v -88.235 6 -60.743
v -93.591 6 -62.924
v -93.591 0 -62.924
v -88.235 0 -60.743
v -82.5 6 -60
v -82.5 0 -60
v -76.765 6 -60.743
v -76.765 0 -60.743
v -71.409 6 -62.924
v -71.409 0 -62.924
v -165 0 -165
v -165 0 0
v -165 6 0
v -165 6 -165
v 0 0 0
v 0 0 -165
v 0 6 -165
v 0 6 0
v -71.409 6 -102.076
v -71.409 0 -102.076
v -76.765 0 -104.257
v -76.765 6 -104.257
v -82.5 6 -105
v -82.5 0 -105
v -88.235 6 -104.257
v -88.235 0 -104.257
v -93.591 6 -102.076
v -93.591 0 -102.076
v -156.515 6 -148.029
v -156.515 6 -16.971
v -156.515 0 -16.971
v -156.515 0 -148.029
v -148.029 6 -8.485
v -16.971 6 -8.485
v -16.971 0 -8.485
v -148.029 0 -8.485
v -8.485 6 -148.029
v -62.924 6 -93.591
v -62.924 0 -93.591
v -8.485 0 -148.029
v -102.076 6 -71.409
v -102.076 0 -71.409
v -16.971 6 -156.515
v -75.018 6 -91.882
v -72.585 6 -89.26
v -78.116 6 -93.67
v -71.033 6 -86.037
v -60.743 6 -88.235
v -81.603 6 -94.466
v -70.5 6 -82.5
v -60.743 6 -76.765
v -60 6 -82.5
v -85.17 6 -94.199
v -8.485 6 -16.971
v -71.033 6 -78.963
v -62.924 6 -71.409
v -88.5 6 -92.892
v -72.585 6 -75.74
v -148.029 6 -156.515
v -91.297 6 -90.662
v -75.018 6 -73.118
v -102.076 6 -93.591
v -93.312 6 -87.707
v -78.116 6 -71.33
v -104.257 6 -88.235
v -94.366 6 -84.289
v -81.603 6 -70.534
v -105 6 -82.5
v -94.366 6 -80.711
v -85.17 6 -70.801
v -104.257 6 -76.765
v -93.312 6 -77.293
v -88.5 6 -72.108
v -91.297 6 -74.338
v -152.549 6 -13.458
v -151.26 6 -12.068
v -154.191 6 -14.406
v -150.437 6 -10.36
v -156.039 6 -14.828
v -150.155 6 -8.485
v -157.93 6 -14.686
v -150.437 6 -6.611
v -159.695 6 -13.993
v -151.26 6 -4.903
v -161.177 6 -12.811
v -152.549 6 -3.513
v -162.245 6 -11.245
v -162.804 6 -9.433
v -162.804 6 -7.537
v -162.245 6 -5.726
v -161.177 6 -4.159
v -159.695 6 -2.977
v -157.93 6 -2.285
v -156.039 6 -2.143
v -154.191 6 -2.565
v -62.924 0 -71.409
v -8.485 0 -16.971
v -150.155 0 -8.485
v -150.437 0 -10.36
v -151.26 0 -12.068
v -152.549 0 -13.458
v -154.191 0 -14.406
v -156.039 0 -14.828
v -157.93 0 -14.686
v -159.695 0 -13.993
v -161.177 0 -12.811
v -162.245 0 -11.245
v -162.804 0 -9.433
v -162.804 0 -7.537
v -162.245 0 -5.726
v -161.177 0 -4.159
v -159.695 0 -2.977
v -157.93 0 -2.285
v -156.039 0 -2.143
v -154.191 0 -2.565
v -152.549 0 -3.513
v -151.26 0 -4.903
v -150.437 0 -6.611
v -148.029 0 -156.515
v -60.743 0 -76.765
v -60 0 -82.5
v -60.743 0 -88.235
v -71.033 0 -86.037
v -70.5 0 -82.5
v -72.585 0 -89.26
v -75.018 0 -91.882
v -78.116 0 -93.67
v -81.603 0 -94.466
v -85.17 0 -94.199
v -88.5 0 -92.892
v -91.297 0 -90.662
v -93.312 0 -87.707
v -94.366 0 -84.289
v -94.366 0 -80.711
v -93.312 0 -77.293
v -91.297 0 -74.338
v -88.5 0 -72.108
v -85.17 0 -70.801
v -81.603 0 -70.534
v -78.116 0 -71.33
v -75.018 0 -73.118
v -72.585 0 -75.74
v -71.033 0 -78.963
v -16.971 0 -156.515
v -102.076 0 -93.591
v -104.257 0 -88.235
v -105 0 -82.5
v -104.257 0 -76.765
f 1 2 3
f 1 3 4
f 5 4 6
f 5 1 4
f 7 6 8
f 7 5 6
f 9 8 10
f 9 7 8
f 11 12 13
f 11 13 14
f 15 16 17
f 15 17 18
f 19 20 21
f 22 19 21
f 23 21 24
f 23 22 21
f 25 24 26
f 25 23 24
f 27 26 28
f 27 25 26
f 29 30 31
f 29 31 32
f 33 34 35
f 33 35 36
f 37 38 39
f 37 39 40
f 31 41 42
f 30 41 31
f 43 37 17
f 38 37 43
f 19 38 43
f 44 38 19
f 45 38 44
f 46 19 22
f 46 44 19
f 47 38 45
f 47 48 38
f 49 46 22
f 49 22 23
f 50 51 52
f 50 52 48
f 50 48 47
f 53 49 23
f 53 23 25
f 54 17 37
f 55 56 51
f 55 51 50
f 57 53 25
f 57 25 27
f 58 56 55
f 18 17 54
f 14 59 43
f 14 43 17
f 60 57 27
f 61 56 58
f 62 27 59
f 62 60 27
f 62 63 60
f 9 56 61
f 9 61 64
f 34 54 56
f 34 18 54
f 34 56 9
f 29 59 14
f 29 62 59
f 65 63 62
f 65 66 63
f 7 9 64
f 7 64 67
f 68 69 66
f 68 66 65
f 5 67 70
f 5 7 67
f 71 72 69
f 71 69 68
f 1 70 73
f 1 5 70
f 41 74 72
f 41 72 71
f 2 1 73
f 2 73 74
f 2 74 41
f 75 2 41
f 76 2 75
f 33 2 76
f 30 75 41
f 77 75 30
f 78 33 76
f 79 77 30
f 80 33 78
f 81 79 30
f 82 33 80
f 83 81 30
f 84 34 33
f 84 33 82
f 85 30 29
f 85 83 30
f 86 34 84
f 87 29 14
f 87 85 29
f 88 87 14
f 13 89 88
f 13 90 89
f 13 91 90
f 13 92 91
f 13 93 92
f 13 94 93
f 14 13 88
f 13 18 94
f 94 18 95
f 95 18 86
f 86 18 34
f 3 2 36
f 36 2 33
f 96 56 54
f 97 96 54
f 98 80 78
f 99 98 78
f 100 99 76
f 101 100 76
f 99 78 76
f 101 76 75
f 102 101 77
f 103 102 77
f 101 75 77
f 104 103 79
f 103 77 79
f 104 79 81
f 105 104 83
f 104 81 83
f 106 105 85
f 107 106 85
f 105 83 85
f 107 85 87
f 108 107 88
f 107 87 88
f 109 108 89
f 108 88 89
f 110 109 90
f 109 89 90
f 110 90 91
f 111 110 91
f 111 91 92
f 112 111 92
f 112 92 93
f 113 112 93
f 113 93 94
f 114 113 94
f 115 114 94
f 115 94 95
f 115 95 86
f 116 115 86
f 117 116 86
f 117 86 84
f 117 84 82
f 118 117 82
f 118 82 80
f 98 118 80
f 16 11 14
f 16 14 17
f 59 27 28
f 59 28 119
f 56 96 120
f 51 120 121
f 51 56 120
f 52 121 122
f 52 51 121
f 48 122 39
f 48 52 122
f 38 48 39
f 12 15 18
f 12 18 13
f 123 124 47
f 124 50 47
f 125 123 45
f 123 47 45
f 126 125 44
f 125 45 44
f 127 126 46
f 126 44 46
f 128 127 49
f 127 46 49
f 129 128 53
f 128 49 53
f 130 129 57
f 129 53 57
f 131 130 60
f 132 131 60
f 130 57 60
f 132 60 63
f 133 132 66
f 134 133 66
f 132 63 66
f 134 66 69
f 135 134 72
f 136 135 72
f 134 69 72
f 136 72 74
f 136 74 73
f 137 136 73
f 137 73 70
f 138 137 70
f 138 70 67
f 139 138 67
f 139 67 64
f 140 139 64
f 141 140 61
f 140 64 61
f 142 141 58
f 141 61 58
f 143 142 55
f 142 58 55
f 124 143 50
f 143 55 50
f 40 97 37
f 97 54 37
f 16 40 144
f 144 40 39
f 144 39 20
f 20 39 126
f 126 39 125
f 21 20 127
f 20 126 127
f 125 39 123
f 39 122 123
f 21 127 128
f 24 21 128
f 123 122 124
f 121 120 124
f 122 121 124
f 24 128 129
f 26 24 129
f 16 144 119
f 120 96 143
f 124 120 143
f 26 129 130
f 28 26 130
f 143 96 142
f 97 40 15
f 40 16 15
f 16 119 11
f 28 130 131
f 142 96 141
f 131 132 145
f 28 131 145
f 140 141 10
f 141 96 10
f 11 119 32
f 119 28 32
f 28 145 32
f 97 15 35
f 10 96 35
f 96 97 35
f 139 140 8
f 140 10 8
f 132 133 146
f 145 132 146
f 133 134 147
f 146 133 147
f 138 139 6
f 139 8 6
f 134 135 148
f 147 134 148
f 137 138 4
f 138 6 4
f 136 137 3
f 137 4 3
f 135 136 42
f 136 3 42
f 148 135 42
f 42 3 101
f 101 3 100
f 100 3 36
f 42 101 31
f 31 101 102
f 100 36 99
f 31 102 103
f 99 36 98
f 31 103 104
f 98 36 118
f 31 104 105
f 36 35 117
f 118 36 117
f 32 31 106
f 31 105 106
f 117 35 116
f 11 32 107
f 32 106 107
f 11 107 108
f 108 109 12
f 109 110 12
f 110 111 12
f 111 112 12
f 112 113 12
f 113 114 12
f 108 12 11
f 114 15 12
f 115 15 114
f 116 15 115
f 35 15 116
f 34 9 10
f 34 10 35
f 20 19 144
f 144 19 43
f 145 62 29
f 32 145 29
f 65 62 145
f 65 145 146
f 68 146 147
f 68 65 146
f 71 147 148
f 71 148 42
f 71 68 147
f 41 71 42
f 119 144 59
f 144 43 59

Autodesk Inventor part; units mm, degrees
ref_plane "YZ Plane" through (0, 0, 0) normal (1, 0, 0) x (0, 1, 0)
ref_plane "XZ Plane" through (0, 0, 0) normal (0, 1, 0) x (-1, 0, 0)
ref_plane "XY Plane" through (0, 0, 0) normal (0, 0, 1) x (1, 0, 0)
sketch "Boceto4" plane through (0, 0, 0) normal (0, 1, 0) x (-1, 0, 0)
  line L0 (0, 0) -> (165, 0)
  line L1 (165, 0) -> (165, -165)
  line L2 (165, -165) -> (0, -165)
  line L3 (0, -165) -> (0, 0)
  dimension "d6" = 165
  dimension "d7" = 165
extrude "Extrusión2" add sketch "Boceto4" along normal blind 6
sketch "Boceto5" plane through (0, 6, 0) normal (0, 1, 0) x (1, 0, 0)
  line L0 (-165, 0) -> (0, 0) projected
  line L1 (0, 165) -> (-165, 165) projected
  line L2 (0, 0) -> (-165, 165)
  line L3 (-165, 165) -> (0, 165)
  line L4 (-165, 165) -> (-165, 0) projected
  line L5 (0, 165) -> (-165, 0)
  circle A0 centre (-82.5, 82.5) radius 12
  circle A1 centre (-82.5, 82.5) radius 22.5
  line L6 (-82.5, 82.5) -> (-89.5711, 75.4289)
  line L7 (-82.5, 82.5) -> (-75.4289, 89.5711)
  line L8 (0, 0) -> (0, 165) projected
  line L9 (-82.5, 82.5) -> (-86.7426, 78.2574)
  line L10 (-86.7426, 78.2574) -> (-8.4853, 0)
  line L11 (-82.5, 82.5) -> (-78.2574, 86.7426)
  line L12 (-78.2574, 86.7426) -> (0, 8.4853)
  line L13 (-86.7426, 78.2574) -> (-165, 156.5147)
  line L14 (-78.2574, 86.7426) -> (-156.5147, 165)
  dimension "d10" = 24
  dimension "d11" = 45
  dimension "d14" = 6
  dimension "d15" = 6
extrude "Extrusión3" cut sketch "Boceto5" against normal through all contours A0 L13 L5 | L5 L10 A0 | L10 L5 L2 A0 | A0 L2 L5 L13 | L2 L5 L12 A0 | A0 L14 L5 L2 | L12 L5 A0 | A0 L5 L14
sketch "Boceto6" plane through (0, 6, 0) normal (0, 1, 0) x (1, 0, 0)
  line L0 (-165, 165) -> (-165, 0) projected
  line L1 (-165, 165) -> (0, 0)
  line L2 (0, 0) -> (0, 165) projected
  line L3 (-165, 0) -> (0, 165)
  circle A0 centre (-82.5, 82.5) radius 22.5
  line L4 (-82.5, 82.5) -> (-86.7426, 86.7426)
  line L5 (-86.7426, 86.7426) -> (-165, 8.4853)
  line L6 (-82.5, 82.5) -> (-78.2574, 78.2574)
  line L7 (-78.2574, 78.2574) -> (-156.5147, 0)
  line L8 (-165, 0) -> (0, 0) projected
  line L9 (-86.7426, 86.7426) -> (-8.4853, 165)
  line L10 (0, 165) -> (-165, 165) projected
  line L11 (-78.2574, 78.2574) -> (0, 156.5147)
  line L12 (-82.5, 82.5) -> (-78.2574, 86.7426)
  line L13 (-82.5, 82.5) -> (-78.2574, 86.7426)
  line L14 (-78.2574, 86.7426) -> (-156.5147, 165)
  line L15 (-82.5, 82.5) -> (-86.7426, 78.2574)
  line L16 (-86.7426, 78.2574) -> (-165, 156.5147)
  line L17 (-86.7426, 78.2574) -> (-8.4853, 0)
  line L18 (-165, 0) -> (-165, 165)
  line L19 (0, 165) -> (-165, 165)
  line L20 (0, 0) -> (0, 165)
  line L21 (-165, 0) -> (0, 0)
  line L22 (-165, 0) -> (0, 0) projected
  circle A1 centre (-82.5, 82.5) radius 12 projected
  line L23 (0, 165) -> (-165, 165) projected
  line L24 (-165, 165) -> (-165, 0) projected
  line L25 (-165, 0) -> (0, 0) projected
  line L26 (0, 0) -> (0, 165) projected
  circle A2 centre (-82.5, 82.5) radius 12 projected
  line L27 (0, 165) -> (-165, 165) projected
  line L28 (-165, 165) -> (-165, 0) projected
  line L29 (-165, 0) -> (0, 0) projected
  line L30 (0, 0) -> (0, 165) projected
  line L31 (0, -1.5147) -> (0, 8.4853)
  line L32 (0, 8.4853) -> (-165, 8.4853)
  line L33 (-156.5147, 0) -> (-156.5147, 165)
  line L34 (-8.4853, 0) -> (-8.4853, 165)
  line L35 (0, 156.5147) -> (-165, 156.5147)
  line L36 (-78.2574, 86.7426) -> (0, 8.4853)
  point P0 (-16.9706, 156.5147)
  point P1 (-148.0294, 156.5147)
  point P2 (-93.5911, 102.0764)
  point P3 (-71.4089, 102.0764)
  point P4 (-62.9236, 71.4089)
  point P5 (-8.4853, 16.9706)
  point P6 (-8.4853, 148.0294)
  point P7 (-62.9236, 93.5911)
  point P8 (-148.0294, 8.4853)
  point P9 (-16.9706, 8.4853)
  point P10 (-71.4089, 62.9236)
  point P11 (-93.5911, 62.9236)
  point P12 (-156.5147, 148.0294)
  point P13 (-156.5147, 16.9706)
  point P14 (-102.0764, 71.4089)
  point P15 (-102.0764, 93.5911)
  dimension "d18" = 45
  dimension "d19" = 6
  dimension "d20" = 6
  dimension "d21" = 6
  dimension "d22" = 6
  dimension "d24" = 10
extrude "Extrusión4" cut sketch "Boceto6" against normal through all contours L16 A0 L5 L33 | L35 L9 A0 L14 | L7 A0 L17 L32 | L34 L36 A0 L11
sketch "Boceto7" plane through (0, 6, 0) normal (0, 1, 0) x (1, 0, 0)
  point P0 (0, 0)
sketch "Boceto8" plane through (0, 6, 0) normal (0, 1, 0) x (1, 0, 0)
  line L0 (-148.0294, 156.5147) -> (-16.9706, 156.5147) projected
  line L1 (-165, 165) -> (-165, 0) projected
  line L2 (-16.9706, 8.4853) -> (-148.0294, 8.4853) projected
  line L3 (-16.9706, 156.5147) -> (-71.4089, 102.0764) projected
  circle A0 centre (-156.5147, 8.4853) radius 6.36
  point P0 (0, 0)
extrude "Extrusión5" cut sketch "Boceto8" against normal through all
